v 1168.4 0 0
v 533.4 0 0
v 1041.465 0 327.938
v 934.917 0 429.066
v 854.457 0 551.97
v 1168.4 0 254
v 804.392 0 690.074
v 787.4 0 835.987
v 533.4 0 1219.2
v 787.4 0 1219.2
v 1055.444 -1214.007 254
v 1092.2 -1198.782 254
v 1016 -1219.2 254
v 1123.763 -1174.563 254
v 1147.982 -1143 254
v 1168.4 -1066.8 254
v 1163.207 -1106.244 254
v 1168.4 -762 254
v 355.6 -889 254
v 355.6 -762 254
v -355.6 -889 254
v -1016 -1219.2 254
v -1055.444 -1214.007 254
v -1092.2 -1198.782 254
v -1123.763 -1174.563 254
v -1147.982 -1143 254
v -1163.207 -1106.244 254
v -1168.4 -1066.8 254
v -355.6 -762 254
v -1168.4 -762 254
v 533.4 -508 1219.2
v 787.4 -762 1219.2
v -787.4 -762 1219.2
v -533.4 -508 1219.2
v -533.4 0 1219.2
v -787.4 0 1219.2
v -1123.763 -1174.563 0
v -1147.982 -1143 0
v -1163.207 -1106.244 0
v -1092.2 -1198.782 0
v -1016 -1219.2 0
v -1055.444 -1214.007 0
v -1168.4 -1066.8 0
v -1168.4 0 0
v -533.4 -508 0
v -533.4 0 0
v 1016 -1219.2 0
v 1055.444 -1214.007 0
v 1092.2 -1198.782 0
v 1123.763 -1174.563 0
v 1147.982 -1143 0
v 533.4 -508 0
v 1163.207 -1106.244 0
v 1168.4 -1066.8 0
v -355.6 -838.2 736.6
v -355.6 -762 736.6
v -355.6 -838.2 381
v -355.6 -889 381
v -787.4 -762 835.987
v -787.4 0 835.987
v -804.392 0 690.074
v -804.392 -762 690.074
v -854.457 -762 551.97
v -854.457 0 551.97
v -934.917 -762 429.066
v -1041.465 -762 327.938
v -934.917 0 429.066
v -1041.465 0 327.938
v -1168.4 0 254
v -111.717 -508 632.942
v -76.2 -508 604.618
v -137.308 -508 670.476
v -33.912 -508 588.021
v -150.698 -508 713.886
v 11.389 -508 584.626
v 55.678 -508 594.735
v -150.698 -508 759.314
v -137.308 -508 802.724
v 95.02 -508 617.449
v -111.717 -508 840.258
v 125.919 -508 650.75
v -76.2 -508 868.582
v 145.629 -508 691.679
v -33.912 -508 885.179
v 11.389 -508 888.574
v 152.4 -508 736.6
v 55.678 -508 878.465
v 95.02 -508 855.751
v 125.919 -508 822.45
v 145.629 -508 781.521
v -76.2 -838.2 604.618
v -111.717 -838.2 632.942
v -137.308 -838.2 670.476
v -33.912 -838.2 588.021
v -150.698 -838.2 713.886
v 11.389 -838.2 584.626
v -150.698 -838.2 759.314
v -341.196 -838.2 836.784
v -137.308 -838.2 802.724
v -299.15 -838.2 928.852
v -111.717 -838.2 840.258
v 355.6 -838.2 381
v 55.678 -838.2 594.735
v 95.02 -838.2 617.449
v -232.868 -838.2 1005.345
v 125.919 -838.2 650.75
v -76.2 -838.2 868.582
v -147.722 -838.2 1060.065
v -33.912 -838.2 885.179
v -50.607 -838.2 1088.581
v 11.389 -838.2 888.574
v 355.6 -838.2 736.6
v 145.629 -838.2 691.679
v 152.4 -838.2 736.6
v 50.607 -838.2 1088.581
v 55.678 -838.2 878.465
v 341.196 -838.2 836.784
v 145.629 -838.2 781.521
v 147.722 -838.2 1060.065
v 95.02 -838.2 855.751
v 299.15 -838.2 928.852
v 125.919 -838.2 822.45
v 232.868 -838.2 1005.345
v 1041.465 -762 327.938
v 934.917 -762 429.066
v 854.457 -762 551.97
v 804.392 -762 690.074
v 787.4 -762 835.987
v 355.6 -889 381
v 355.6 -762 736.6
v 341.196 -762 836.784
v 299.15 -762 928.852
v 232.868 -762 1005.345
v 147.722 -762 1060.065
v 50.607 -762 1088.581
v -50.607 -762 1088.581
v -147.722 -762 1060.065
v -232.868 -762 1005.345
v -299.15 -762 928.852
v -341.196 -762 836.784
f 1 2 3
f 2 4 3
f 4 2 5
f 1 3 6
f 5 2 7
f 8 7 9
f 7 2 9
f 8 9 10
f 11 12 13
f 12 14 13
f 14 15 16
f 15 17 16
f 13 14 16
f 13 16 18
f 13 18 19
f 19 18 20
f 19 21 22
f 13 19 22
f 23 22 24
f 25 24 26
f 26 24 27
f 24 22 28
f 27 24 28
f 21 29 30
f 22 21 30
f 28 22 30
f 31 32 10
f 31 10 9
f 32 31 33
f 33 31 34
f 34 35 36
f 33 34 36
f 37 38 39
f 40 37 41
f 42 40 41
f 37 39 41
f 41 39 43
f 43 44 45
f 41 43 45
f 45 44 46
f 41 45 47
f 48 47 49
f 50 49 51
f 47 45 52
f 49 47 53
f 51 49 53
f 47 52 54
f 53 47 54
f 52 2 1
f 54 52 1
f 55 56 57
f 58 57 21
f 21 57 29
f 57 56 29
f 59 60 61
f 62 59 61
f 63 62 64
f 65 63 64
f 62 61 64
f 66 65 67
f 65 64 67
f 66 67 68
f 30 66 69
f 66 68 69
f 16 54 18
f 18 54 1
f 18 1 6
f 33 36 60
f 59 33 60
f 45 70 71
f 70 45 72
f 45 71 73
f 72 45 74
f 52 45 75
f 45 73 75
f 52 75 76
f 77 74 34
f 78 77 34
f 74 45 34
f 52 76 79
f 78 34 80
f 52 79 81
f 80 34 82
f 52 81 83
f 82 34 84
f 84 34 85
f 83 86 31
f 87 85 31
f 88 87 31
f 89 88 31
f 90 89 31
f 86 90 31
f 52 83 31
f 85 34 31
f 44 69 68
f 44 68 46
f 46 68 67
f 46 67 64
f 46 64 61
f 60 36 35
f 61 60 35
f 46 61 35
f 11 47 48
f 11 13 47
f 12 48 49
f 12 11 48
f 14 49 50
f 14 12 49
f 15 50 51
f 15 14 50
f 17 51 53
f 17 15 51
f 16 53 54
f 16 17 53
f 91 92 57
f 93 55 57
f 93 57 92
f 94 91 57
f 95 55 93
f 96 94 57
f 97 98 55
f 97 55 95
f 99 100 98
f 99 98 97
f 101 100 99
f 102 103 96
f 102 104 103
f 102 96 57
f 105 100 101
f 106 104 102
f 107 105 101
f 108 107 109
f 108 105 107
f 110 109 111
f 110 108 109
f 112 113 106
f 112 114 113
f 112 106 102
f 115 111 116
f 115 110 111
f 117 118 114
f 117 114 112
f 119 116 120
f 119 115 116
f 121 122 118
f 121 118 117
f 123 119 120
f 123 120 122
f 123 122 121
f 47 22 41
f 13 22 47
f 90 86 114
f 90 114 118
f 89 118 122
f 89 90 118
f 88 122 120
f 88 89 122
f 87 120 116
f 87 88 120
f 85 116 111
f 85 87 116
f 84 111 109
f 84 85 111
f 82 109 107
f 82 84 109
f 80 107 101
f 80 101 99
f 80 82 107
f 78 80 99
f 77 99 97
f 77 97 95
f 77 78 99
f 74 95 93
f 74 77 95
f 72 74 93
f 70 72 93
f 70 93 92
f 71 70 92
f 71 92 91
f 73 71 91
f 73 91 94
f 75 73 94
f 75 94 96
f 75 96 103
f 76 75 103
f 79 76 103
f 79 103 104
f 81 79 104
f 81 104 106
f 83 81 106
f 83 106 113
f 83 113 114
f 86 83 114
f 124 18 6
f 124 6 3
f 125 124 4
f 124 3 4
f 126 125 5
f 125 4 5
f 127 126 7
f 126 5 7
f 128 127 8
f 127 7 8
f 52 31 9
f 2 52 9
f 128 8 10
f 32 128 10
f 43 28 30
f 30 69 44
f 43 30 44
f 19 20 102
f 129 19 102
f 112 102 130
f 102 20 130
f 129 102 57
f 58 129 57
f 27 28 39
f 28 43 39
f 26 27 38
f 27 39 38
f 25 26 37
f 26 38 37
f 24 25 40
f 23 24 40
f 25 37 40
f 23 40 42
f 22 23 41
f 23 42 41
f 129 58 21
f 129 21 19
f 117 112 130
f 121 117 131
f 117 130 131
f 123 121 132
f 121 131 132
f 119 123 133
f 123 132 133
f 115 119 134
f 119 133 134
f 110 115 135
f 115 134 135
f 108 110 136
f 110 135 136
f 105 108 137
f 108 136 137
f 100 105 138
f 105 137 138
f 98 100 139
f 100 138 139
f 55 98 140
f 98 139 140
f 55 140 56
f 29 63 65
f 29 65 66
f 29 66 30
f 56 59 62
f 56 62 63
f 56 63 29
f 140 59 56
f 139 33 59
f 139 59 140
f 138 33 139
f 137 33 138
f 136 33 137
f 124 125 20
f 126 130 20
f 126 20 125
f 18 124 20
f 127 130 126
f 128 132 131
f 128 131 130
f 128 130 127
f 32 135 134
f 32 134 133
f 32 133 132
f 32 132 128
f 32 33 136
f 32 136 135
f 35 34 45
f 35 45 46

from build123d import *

# Parameters (mm, degrees)
F2_DEPTH = 762
F3_DEPTH = 1219.2
F1_R     = 152.4
F4_DEPTH = 838.2
F5_DEPTH = 889
F6_W     = 1066.8
F6_H     = 508
F7_DEPTH = 2270.76
F8_R     = 152.4


with BuildPart() as f2:
    # F1 (on Front) → F2 (new body)
    with BuildSketch(Plane.XZ):
        with BuildLine():
            Line((355.6, 254), (1168.4, 254))
            ThreePointArc((1168.4, 254), (891.1208831509, 488.1832892436), (787.4, 835.9871132594))
            Line((787.4, 835.9871132594), (787.4, 1219.2))
            Line((787.4, 1219.2), (0, 1219.2))
            Line((0, 1219.2), (-787.4, 1219.2))
            Line((-787.4, 1219.2), (-787.4, 835.9871132594))
            ThreePointArc((-787.4, 835.9871132594), (-891.1208831509, 488.1832892436), (-1168.4, 254))
            Line((-1168.4, 254), (-355.6, 254))
            Line((-355.6, 254), (-355.6, 381))
            Line((-355.6, 381), (-355.6, 736.6))
            ThreePointArc((-355.6, 736.6), (0, 1092.2), (355.6, 736.6))
            Line((355.6, 736.6), (355.6, 381))
            Line((355.6, 381), (355.6, 254))
        make_face()
    extrude(amount=F2_DEPTH)

    # F1 (on Front) → F3 (join)
    with BuildSketch(Plane.XZ):
        Polygon((-1168.4, 0), (0, 0), (1168.4, 0), (1168.4, 254), (355.6, 254), (0, 254), (-355.6, 254), (-1168.4, 254), align=None)
    extrude(amount=F3_DEPTH)

    # F1 (on Front) → F4 (join)
    with BuildSketch(Plane.XZ):
        with BuildLine():
            ThreePointArc((1.7647e-06, 381), (251.4471720139, 485.152829234), (355.6, 736.6))
            ThreePointArc((355.6, 736.6), (0, 1092.2), (-355.6, 736.6))
            ThreePointArc((-355.6, 736.6), (-251.447170766, 485.1528279861), (1.7647e-06, 381))
        make_face()
        with Locations((0, 736.6)):
            Circle(F1_R, mode=Mode.SUBTRACT)
        with BuildLine():
            Line((-355.6, 736.6), (-355.6, 381))
            Line((-355.6, 381), (1.7647e-06, 381))
            ThreePointArc((1.7647e-06, 381), (-251.447170766, 485.1528279861), (-355.6, 736.6))
        make_face()
        with BuildLine():
            Line((1.7647e-06, 381), (355.6, 381))
            Line((355.6, 381), (355.6, 736.6))
            ThreePointArc((355.6, 736.6), (251.4471720139, 485.152829234), (1.7647e-06, 381))
        make_face()
    extrude(amount=F4_DEPTH)

    # F1 (on Front) → F5 (join)
    with BuildSketch(Plane.XZ):
        Polygon((0, 254), (355.6, 254), (355.6, 381), (1.7647e-06, 381), (-355.6, 381), (-355.6, 254), align=None)
    extrude(amount=F5_DEPTH)

    # F6 (on face) → F7 (cut)
    with BuildSketch(Plane.XY.offset(1219.2)):
        with Locations((0, -254)):
            Rectangle(F6_W, F6_H)
    extrude(amount=-F7_DEPTH, mode=Mode.SUBTRACT)

    # F8
    f8_edges = [f2.edges().sort_by_distance(p)[0] for p in [
        (1168.4, -1219.2, 127),
        (-1168.4, -1219.2, 127),
    ]]
    fillet(f8_edges, radius=F8_R)


solid = f2.part
